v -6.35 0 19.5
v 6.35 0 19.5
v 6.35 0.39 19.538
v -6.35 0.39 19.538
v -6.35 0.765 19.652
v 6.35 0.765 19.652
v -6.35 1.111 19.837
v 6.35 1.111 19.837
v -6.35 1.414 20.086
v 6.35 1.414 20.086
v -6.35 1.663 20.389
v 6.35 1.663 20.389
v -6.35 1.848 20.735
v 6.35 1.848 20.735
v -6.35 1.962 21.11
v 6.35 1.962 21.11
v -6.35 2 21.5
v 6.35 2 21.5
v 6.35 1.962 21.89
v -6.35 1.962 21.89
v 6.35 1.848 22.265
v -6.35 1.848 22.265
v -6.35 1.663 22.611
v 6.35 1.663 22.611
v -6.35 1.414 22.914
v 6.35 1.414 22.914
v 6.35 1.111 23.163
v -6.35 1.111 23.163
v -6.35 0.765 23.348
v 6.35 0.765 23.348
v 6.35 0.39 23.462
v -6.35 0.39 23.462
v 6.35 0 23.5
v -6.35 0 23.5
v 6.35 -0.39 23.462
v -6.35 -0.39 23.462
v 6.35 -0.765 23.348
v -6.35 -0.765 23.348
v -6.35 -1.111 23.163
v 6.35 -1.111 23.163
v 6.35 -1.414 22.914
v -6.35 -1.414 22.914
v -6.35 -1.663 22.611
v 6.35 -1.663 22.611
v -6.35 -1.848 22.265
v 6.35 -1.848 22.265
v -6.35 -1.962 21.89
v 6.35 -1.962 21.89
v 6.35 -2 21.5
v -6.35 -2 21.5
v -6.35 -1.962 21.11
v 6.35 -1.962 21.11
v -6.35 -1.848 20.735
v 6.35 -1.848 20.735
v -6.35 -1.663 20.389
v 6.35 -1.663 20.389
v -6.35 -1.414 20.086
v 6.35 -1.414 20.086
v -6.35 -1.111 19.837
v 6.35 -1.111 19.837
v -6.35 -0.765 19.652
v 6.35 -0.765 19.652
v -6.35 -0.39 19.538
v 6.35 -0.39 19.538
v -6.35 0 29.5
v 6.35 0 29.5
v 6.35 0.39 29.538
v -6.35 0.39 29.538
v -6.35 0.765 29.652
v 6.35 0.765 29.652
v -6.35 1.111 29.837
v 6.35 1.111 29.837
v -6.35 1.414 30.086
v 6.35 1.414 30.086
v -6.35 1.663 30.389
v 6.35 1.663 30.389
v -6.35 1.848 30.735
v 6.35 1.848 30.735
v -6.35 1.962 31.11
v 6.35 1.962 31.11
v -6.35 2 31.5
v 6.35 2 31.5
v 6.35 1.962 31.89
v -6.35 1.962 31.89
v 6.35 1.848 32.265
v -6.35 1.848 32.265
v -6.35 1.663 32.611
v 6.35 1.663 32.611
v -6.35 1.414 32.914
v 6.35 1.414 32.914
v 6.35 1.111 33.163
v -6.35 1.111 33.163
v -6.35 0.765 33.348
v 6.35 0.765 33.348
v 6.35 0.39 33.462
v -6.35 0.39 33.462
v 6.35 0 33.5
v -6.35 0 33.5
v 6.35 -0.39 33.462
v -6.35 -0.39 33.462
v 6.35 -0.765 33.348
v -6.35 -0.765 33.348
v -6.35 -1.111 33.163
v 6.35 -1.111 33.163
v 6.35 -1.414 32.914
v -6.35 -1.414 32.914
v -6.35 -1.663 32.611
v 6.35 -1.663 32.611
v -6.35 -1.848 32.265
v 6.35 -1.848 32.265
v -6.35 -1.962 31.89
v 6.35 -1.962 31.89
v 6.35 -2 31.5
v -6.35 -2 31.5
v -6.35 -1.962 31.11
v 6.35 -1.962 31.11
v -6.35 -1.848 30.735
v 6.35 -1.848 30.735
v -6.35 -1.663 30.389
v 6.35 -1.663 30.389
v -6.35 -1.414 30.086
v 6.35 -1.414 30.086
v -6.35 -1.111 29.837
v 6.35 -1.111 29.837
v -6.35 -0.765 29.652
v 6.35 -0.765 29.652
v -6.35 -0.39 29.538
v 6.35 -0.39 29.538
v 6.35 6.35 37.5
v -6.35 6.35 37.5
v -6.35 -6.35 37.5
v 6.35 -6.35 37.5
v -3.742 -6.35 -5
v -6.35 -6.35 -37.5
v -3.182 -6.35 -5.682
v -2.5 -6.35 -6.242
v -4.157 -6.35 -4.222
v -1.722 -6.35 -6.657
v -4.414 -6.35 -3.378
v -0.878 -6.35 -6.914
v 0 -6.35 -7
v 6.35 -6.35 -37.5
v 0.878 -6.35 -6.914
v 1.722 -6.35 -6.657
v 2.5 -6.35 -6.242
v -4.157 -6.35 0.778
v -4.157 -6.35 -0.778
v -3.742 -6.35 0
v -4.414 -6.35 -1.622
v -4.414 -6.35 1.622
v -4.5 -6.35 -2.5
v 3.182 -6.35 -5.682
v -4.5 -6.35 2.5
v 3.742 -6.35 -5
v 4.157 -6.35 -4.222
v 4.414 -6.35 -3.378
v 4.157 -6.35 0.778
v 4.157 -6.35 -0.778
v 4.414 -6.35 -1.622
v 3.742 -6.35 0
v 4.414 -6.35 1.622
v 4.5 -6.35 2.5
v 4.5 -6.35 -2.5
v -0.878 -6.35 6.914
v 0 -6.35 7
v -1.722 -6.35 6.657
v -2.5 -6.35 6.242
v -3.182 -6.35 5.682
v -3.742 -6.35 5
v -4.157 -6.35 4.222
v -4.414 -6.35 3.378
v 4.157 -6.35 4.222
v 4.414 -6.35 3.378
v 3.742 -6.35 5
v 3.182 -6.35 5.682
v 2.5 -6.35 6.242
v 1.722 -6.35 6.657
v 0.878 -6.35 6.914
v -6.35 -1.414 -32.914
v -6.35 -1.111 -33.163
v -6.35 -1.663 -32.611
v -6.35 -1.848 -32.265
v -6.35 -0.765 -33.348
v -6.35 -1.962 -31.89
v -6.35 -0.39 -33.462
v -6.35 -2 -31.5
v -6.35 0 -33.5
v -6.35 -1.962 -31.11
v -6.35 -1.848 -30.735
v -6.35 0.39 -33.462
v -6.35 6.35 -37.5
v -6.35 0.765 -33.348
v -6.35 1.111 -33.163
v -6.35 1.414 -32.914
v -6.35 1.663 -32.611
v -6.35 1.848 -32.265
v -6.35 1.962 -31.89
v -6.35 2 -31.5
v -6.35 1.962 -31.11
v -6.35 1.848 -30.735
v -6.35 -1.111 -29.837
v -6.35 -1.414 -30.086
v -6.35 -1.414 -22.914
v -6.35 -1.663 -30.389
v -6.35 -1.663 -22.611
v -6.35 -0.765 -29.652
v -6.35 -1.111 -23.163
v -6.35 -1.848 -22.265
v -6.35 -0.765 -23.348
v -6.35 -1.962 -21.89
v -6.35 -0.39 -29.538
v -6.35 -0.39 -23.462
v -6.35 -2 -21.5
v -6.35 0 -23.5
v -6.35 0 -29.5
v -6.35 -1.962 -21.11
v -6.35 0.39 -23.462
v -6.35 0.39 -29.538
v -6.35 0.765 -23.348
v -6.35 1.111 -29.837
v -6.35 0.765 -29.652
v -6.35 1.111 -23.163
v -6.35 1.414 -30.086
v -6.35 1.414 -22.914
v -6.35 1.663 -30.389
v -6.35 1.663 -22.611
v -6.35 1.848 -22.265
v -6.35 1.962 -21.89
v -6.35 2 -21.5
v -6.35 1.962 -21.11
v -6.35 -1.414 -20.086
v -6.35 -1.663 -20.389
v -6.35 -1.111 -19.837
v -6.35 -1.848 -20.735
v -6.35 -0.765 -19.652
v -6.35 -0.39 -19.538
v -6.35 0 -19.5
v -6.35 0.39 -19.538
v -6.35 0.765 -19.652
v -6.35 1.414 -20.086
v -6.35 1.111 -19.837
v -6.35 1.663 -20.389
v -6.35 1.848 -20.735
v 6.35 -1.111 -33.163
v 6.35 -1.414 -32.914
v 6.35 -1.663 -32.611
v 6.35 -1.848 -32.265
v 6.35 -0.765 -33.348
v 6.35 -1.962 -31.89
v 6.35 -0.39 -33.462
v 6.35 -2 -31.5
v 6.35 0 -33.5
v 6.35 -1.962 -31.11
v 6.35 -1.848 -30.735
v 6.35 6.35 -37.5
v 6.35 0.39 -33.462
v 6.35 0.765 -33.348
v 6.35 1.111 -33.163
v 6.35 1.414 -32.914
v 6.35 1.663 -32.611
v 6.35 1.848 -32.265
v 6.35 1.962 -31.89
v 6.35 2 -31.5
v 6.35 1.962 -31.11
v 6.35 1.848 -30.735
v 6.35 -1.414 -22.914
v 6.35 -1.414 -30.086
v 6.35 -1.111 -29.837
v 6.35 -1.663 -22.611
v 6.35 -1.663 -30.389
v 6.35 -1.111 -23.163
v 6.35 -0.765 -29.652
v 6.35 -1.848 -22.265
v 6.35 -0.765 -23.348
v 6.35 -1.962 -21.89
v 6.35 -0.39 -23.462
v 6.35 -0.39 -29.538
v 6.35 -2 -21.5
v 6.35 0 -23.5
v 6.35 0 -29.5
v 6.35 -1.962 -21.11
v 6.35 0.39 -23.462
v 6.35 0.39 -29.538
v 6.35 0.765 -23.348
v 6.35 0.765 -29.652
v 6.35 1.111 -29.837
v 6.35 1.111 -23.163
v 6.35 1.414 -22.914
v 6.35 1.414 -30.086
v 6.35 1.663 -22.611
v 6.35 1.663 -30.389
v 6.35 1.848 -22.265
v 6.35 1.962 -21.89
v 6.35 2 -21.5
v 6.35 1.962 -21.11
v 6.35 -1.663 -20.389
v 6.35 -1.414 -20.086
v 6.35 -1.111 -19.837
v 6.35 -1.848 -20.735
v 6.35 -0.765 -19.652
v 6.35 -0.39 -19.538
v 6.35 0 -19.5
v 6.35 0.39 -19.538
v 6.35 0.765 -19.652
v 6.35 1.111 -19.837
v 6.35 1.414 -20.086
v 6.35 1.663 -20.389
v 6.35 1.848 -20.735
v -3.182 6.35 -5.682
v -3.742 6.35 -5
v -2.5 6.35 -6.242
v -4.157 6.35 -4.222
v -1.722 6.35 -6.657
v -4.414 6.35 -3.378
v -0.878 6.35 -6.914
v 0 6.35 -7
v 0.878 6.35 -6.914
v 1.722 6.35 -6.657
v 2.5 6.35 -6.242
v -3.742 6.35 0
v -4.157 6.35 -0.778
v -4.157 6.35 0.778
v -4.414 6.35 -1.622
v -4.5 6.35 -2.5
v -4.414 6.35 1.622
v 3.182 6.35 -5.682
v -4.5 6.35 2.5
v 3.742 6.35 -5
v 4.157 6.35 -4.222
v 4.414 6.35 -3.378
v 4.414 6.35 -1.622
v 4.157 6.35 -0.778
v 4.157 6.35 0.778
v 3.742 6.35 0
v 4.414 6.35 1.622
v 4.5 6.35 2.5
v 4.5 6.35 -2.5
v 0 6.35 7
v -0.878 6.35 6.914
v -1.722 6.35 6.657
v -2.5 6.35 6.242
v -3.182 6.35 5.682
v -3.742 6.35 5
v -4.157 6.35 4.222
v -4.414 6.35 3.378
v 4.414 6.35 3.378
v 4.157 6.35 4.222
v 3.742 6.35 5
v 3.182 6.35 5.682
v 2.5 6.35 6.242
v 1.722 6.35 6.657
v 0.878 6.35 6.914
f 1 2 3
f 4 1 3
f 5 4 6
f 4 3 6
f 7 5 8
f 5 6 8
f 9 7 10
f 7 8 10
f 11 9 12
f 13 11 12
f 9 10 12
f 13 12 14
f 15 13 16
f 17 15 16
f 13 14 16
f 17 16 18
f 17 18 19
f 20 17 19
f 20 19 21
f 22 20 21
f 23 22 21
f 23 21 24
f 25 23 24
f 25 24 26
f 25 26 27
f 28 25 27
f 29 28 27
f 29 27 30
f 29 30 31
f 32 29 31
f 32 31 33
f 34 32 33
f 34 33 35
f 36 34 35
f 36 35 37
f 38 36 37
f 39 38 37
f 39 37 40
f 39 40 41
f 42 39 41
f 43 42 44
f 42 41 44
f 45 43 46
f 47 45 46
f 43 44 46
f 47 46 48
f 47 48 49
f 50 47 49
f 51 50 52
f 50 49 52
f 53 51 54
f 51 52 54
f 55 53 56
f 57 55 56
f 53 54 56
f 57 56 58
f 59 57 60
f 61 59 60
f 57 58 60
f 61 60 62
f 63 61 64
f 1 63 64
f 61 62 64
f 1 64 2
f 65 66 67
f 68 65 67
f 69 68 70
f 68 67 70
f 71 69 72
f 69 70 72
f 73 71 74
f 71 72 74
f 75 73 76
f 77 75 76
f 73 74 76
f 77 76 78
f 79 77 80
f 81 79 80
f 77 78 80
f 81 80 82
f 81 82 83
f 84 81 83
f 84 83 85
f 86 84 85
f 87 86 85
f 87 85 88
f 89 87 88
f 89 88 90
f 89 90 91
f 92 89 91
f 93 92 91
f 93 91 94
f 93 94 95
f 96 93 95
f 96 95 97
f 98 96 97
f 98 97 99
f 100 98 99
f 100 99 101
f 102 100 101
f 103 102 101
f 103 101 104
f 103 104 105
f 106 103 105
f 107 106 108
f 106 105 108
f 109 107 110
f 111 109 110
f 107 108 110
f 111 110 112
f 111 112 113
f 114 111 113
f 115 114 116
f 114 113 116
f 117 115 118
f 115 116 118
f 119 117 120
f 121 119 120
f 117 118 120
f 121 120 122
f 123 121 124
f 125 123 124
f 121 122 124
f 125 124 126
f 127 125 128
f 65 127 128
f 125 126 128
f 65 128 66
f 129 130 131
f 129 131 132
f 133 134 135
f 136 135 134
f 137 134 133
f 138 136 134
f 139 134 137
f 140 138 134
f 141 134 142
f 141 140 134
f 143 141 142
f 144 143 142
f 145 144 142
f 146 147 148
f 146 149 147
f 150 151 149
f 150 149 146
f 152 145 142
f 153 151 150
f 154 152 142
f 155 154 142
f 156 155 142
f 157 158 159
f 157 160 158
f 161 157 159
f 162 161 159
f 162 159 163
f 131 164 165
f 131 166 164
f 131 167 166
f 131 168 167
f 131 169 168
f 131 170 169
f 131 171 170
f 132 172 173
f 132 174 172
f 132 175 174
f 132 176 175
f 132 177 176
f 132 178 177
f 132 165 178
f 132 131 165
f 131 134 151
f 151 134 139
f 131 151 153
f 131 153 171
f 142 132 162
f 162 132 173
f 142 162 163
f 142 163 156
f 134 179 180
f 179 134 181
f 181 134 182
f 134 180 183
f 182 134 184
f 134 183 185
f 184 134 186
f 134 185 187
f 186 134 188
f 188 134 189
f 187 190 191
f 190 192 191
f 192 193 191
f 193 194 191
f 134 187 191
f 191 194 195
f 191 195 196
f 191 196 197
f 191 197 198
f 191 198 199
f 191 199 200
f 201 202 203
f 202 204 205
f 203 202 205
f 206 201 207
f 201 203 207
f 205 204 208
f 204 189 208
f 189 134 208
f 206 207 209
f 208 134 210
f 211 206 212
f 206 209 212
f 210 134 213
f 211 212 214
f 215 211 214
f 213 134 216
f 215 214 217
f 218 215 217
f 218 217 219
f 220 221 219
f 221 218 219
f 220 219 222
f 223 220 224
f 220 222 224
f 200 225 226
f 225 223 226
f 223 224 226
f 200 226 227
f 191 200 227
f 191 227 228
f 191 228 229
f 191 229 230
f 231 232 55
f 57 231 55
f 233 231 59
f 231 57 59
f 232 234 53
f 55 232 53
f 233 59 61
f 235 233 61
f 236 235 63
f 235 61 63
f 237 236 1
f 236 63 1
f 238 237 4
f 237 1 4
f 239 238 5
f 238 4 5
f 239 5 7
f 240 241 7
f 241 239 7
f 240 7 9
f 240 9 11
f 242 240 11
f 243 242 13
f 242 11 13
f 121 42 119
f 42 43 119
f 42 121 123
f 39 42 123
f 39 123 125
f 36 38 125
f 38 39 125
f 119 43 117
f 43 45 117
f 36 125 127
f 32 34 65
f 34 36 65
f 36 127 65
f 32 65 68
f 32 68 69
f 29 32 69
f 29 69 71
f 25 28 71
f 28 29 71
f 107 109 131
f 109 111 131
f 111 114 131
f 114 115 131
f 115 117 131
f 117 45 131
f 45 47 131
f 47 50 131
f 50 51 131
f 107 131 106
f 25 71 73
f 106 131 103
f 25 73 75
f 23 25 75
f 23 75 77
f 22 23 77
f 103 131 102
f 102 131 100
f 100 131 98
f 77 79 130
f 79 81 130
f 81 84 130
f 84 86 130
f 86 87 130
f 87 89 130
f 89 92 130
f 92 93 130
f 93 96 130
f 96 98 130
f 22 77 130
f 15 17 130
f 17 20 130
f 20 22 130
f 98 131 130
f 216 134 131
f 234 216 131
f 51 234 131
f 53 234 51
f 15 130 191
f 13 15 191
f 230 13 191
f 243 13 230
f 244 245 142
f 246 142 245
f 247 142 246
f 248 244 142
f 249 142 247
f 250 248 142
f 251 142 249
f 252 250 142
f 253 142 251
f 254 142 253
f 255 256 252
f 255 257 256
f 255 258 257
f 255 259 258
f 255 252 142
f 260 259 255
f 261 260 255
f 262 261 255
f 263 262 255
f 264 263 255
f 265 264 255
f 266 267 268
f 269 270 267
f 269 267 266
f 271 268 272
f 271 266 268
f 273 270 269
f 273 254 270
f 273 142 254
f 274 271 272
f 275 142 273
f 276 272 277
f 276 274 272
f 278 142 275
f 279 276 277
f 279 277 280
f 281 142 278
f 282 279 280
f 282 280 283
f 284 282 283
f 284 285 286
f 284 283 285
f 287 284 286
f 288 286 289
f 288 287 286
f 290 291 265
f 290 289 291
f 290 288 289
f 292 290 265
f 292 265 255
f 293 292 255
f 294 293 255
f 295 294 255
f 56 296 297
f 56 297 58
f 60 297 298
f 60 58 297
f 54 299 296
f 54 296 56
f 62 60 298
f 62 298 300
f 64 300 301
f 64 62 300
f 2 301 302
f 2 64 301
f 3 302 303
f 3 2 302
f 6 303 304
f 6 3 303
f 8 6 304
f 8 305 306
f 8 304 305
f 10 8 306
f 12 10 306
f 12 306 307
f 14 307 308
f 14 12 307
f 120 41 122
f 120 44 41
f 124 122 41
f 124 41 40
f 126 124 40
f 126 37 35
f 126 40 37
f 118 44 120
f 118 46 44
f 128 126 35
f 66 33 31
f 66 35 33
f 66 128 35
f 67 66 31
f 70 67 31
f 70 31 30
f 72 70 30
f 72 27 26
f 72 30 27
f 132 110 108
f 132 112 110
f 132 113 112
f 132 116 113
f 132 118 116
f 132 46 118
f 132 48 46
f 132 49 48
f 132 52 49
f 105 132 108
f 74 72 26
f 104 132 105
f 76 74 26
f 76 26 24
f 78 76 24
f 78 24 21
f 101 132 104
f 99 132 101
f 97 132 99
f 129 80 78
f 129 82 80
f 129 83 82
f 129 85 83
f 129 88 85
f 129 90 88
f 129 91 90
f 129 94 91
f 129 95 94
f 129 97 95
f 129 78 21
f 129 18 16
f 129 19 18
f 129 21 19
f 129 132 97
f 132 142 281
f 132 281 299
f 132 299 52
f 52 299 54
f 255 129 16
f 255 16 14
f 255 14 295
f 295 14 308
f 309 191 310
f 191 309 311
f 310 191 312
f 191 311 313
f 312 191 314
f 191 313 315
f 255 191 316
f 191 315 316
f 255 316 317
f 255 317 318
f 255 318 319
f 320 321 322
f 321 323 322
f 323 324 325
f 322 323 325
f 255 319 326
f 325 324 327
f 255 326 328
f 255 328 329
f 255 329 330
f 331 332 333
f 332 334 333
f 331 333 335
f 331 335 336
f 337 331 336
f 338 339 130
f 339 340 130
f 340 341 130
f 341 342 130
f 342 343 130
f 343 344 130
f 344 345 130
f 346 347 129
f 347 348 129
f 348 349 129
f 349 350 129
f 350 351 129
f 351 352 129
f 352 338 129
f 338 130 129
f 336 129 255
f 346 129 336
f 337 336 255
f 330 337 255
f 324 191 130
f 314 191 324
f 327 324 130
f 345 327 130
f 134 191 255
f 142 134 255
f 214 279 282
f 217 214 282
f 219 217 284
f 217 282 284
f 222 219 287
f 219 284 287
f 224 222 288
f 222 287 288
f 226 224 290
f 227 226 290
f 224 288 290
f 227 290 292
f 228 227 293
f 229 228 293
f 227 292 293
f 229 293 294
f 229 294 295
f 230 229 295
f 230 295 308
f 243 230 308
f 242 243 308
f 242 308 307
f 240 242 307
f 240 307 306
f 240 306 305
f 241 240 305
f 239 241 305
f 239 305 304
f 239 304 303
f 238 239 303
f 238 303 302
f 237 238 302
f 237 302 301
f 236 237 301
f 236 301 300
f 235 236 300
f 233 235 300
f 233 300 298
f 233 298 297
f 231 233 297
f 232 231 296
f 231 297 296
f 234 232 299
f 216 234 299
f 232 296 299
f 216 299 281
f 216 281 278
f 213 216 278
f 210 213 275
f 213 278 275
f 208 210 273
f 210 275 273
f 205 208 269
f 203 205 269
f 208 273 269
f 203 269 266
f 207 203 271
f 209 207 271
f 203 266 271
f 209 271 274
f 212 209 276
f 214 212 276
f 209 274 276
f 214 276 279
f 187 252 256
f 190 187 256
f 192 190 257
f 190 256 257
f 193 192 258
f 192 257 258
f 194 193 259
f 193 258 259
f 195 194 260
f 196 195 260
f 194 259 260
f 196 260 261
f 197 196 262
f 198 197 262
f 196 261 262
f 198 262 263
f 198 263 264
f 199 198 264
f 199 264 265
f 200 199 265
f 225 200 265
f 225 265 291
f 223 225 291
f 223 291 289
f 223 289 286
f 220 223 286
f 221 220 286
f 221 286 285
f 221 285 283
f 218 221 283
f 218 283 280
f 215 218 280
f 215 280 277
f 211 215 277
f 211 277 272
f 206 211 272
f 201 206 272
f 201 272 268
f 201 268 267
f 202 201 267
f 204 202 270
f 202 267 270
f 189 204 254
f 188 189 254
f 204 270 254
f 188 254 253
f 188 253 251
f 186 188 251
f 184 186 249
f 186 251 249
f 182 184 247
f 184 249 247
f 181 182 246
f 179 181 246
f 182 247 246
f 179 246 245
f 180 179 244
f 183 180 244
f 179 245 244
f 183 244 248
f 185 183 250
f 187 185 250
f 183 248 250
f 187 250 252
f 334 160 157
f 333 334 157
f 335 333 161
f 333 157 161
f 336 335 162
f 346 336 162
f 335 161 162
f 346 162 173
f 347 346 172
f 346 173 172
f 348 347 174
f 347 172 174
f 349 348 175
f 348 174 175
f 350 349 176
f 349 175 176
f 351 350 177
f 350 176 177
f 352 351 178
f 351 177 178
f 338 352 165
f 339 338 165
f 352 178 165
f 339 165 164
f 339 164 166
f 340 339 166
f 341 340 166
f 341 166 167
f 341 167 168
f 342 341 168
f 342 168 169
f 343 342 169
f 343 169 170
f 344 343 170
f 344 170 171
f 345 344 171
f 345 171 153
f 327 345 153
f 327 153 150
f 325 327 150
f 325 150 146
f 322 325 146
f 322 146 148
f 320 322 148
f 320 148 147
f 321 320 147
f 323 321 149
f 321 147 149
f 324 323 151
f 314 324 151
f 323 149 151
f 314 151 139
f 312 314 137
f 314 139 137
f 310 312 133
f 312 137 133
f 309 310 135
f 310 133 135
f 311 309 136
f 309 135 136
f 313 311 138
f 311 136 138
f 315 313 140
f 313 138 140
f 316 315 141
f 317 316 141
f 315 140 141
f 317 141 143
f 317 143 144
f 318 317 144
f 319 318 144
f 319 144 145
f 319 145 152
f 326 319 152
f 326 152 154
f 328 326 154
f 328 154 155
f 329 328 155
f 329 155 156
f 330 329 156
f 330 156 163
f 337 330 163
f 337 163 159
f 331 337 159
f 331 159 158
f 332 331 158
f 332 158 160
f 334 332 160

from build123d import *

# Parameters (mm, degrees)
SKETCH1_W           = 12.7
SKETCH1_H           = 12.7
BOSS_EXTRUDE1_DEPTH = 37.5
SKETCH2_R           = 2
CUT_EXTRUDE1_DEPTH  = 80
CUT_EXTRUDE2_DEPTH  = 80


with BuildPart() as part:
    # Sketch1 → Boss-Extrude1 (new, symmetric)
    with BuildSketch(Plane.XY):
        Rectangle(SKETCH1_W, SKETCH1_H)
    extrude(amount=BOSS_EXTRUDE1_DEPTH, both=True)

    # Sketch2 → Cut-Extrude1 (cut)
    with BuildSketch(Plane(origin=(6.35, 0, 0), x_dir=(0, 0, -1), z_dir=(1, 0, 0))):
        with Locations((-31.5, 0)):
            Circle(SKETCH2_R)
        with Locations((-21.5, 0)):
            Circle(SKETCH2_R)
        with Locations((21.5, 0)):
            Circle(SKETCH2_R)
        with Locations((31.5, 0)):
            Circle(SKETCH2_R)
    extrude(amount=-CUT_EXTRUDE1_DEPTH, mode=Mode.SUBTRACT)

    # Sketch3 → Cut-Extrude2 (cut)
    with BuildSketch(Plane.XZ.offset(6.35)):
        with BuildLine():
            ThreePointArc((3.741657387, 0), (0, 7), (-3.741657387, 0))
            ThreePointArc((-3.741657387, 0), (0, -7), (3.741657387, 0))
        make_face()
    extrude(amount=-CUT_EXTRUDE2_DEPTH, mode=Mode.SUBTRACT)


solid = part.part
